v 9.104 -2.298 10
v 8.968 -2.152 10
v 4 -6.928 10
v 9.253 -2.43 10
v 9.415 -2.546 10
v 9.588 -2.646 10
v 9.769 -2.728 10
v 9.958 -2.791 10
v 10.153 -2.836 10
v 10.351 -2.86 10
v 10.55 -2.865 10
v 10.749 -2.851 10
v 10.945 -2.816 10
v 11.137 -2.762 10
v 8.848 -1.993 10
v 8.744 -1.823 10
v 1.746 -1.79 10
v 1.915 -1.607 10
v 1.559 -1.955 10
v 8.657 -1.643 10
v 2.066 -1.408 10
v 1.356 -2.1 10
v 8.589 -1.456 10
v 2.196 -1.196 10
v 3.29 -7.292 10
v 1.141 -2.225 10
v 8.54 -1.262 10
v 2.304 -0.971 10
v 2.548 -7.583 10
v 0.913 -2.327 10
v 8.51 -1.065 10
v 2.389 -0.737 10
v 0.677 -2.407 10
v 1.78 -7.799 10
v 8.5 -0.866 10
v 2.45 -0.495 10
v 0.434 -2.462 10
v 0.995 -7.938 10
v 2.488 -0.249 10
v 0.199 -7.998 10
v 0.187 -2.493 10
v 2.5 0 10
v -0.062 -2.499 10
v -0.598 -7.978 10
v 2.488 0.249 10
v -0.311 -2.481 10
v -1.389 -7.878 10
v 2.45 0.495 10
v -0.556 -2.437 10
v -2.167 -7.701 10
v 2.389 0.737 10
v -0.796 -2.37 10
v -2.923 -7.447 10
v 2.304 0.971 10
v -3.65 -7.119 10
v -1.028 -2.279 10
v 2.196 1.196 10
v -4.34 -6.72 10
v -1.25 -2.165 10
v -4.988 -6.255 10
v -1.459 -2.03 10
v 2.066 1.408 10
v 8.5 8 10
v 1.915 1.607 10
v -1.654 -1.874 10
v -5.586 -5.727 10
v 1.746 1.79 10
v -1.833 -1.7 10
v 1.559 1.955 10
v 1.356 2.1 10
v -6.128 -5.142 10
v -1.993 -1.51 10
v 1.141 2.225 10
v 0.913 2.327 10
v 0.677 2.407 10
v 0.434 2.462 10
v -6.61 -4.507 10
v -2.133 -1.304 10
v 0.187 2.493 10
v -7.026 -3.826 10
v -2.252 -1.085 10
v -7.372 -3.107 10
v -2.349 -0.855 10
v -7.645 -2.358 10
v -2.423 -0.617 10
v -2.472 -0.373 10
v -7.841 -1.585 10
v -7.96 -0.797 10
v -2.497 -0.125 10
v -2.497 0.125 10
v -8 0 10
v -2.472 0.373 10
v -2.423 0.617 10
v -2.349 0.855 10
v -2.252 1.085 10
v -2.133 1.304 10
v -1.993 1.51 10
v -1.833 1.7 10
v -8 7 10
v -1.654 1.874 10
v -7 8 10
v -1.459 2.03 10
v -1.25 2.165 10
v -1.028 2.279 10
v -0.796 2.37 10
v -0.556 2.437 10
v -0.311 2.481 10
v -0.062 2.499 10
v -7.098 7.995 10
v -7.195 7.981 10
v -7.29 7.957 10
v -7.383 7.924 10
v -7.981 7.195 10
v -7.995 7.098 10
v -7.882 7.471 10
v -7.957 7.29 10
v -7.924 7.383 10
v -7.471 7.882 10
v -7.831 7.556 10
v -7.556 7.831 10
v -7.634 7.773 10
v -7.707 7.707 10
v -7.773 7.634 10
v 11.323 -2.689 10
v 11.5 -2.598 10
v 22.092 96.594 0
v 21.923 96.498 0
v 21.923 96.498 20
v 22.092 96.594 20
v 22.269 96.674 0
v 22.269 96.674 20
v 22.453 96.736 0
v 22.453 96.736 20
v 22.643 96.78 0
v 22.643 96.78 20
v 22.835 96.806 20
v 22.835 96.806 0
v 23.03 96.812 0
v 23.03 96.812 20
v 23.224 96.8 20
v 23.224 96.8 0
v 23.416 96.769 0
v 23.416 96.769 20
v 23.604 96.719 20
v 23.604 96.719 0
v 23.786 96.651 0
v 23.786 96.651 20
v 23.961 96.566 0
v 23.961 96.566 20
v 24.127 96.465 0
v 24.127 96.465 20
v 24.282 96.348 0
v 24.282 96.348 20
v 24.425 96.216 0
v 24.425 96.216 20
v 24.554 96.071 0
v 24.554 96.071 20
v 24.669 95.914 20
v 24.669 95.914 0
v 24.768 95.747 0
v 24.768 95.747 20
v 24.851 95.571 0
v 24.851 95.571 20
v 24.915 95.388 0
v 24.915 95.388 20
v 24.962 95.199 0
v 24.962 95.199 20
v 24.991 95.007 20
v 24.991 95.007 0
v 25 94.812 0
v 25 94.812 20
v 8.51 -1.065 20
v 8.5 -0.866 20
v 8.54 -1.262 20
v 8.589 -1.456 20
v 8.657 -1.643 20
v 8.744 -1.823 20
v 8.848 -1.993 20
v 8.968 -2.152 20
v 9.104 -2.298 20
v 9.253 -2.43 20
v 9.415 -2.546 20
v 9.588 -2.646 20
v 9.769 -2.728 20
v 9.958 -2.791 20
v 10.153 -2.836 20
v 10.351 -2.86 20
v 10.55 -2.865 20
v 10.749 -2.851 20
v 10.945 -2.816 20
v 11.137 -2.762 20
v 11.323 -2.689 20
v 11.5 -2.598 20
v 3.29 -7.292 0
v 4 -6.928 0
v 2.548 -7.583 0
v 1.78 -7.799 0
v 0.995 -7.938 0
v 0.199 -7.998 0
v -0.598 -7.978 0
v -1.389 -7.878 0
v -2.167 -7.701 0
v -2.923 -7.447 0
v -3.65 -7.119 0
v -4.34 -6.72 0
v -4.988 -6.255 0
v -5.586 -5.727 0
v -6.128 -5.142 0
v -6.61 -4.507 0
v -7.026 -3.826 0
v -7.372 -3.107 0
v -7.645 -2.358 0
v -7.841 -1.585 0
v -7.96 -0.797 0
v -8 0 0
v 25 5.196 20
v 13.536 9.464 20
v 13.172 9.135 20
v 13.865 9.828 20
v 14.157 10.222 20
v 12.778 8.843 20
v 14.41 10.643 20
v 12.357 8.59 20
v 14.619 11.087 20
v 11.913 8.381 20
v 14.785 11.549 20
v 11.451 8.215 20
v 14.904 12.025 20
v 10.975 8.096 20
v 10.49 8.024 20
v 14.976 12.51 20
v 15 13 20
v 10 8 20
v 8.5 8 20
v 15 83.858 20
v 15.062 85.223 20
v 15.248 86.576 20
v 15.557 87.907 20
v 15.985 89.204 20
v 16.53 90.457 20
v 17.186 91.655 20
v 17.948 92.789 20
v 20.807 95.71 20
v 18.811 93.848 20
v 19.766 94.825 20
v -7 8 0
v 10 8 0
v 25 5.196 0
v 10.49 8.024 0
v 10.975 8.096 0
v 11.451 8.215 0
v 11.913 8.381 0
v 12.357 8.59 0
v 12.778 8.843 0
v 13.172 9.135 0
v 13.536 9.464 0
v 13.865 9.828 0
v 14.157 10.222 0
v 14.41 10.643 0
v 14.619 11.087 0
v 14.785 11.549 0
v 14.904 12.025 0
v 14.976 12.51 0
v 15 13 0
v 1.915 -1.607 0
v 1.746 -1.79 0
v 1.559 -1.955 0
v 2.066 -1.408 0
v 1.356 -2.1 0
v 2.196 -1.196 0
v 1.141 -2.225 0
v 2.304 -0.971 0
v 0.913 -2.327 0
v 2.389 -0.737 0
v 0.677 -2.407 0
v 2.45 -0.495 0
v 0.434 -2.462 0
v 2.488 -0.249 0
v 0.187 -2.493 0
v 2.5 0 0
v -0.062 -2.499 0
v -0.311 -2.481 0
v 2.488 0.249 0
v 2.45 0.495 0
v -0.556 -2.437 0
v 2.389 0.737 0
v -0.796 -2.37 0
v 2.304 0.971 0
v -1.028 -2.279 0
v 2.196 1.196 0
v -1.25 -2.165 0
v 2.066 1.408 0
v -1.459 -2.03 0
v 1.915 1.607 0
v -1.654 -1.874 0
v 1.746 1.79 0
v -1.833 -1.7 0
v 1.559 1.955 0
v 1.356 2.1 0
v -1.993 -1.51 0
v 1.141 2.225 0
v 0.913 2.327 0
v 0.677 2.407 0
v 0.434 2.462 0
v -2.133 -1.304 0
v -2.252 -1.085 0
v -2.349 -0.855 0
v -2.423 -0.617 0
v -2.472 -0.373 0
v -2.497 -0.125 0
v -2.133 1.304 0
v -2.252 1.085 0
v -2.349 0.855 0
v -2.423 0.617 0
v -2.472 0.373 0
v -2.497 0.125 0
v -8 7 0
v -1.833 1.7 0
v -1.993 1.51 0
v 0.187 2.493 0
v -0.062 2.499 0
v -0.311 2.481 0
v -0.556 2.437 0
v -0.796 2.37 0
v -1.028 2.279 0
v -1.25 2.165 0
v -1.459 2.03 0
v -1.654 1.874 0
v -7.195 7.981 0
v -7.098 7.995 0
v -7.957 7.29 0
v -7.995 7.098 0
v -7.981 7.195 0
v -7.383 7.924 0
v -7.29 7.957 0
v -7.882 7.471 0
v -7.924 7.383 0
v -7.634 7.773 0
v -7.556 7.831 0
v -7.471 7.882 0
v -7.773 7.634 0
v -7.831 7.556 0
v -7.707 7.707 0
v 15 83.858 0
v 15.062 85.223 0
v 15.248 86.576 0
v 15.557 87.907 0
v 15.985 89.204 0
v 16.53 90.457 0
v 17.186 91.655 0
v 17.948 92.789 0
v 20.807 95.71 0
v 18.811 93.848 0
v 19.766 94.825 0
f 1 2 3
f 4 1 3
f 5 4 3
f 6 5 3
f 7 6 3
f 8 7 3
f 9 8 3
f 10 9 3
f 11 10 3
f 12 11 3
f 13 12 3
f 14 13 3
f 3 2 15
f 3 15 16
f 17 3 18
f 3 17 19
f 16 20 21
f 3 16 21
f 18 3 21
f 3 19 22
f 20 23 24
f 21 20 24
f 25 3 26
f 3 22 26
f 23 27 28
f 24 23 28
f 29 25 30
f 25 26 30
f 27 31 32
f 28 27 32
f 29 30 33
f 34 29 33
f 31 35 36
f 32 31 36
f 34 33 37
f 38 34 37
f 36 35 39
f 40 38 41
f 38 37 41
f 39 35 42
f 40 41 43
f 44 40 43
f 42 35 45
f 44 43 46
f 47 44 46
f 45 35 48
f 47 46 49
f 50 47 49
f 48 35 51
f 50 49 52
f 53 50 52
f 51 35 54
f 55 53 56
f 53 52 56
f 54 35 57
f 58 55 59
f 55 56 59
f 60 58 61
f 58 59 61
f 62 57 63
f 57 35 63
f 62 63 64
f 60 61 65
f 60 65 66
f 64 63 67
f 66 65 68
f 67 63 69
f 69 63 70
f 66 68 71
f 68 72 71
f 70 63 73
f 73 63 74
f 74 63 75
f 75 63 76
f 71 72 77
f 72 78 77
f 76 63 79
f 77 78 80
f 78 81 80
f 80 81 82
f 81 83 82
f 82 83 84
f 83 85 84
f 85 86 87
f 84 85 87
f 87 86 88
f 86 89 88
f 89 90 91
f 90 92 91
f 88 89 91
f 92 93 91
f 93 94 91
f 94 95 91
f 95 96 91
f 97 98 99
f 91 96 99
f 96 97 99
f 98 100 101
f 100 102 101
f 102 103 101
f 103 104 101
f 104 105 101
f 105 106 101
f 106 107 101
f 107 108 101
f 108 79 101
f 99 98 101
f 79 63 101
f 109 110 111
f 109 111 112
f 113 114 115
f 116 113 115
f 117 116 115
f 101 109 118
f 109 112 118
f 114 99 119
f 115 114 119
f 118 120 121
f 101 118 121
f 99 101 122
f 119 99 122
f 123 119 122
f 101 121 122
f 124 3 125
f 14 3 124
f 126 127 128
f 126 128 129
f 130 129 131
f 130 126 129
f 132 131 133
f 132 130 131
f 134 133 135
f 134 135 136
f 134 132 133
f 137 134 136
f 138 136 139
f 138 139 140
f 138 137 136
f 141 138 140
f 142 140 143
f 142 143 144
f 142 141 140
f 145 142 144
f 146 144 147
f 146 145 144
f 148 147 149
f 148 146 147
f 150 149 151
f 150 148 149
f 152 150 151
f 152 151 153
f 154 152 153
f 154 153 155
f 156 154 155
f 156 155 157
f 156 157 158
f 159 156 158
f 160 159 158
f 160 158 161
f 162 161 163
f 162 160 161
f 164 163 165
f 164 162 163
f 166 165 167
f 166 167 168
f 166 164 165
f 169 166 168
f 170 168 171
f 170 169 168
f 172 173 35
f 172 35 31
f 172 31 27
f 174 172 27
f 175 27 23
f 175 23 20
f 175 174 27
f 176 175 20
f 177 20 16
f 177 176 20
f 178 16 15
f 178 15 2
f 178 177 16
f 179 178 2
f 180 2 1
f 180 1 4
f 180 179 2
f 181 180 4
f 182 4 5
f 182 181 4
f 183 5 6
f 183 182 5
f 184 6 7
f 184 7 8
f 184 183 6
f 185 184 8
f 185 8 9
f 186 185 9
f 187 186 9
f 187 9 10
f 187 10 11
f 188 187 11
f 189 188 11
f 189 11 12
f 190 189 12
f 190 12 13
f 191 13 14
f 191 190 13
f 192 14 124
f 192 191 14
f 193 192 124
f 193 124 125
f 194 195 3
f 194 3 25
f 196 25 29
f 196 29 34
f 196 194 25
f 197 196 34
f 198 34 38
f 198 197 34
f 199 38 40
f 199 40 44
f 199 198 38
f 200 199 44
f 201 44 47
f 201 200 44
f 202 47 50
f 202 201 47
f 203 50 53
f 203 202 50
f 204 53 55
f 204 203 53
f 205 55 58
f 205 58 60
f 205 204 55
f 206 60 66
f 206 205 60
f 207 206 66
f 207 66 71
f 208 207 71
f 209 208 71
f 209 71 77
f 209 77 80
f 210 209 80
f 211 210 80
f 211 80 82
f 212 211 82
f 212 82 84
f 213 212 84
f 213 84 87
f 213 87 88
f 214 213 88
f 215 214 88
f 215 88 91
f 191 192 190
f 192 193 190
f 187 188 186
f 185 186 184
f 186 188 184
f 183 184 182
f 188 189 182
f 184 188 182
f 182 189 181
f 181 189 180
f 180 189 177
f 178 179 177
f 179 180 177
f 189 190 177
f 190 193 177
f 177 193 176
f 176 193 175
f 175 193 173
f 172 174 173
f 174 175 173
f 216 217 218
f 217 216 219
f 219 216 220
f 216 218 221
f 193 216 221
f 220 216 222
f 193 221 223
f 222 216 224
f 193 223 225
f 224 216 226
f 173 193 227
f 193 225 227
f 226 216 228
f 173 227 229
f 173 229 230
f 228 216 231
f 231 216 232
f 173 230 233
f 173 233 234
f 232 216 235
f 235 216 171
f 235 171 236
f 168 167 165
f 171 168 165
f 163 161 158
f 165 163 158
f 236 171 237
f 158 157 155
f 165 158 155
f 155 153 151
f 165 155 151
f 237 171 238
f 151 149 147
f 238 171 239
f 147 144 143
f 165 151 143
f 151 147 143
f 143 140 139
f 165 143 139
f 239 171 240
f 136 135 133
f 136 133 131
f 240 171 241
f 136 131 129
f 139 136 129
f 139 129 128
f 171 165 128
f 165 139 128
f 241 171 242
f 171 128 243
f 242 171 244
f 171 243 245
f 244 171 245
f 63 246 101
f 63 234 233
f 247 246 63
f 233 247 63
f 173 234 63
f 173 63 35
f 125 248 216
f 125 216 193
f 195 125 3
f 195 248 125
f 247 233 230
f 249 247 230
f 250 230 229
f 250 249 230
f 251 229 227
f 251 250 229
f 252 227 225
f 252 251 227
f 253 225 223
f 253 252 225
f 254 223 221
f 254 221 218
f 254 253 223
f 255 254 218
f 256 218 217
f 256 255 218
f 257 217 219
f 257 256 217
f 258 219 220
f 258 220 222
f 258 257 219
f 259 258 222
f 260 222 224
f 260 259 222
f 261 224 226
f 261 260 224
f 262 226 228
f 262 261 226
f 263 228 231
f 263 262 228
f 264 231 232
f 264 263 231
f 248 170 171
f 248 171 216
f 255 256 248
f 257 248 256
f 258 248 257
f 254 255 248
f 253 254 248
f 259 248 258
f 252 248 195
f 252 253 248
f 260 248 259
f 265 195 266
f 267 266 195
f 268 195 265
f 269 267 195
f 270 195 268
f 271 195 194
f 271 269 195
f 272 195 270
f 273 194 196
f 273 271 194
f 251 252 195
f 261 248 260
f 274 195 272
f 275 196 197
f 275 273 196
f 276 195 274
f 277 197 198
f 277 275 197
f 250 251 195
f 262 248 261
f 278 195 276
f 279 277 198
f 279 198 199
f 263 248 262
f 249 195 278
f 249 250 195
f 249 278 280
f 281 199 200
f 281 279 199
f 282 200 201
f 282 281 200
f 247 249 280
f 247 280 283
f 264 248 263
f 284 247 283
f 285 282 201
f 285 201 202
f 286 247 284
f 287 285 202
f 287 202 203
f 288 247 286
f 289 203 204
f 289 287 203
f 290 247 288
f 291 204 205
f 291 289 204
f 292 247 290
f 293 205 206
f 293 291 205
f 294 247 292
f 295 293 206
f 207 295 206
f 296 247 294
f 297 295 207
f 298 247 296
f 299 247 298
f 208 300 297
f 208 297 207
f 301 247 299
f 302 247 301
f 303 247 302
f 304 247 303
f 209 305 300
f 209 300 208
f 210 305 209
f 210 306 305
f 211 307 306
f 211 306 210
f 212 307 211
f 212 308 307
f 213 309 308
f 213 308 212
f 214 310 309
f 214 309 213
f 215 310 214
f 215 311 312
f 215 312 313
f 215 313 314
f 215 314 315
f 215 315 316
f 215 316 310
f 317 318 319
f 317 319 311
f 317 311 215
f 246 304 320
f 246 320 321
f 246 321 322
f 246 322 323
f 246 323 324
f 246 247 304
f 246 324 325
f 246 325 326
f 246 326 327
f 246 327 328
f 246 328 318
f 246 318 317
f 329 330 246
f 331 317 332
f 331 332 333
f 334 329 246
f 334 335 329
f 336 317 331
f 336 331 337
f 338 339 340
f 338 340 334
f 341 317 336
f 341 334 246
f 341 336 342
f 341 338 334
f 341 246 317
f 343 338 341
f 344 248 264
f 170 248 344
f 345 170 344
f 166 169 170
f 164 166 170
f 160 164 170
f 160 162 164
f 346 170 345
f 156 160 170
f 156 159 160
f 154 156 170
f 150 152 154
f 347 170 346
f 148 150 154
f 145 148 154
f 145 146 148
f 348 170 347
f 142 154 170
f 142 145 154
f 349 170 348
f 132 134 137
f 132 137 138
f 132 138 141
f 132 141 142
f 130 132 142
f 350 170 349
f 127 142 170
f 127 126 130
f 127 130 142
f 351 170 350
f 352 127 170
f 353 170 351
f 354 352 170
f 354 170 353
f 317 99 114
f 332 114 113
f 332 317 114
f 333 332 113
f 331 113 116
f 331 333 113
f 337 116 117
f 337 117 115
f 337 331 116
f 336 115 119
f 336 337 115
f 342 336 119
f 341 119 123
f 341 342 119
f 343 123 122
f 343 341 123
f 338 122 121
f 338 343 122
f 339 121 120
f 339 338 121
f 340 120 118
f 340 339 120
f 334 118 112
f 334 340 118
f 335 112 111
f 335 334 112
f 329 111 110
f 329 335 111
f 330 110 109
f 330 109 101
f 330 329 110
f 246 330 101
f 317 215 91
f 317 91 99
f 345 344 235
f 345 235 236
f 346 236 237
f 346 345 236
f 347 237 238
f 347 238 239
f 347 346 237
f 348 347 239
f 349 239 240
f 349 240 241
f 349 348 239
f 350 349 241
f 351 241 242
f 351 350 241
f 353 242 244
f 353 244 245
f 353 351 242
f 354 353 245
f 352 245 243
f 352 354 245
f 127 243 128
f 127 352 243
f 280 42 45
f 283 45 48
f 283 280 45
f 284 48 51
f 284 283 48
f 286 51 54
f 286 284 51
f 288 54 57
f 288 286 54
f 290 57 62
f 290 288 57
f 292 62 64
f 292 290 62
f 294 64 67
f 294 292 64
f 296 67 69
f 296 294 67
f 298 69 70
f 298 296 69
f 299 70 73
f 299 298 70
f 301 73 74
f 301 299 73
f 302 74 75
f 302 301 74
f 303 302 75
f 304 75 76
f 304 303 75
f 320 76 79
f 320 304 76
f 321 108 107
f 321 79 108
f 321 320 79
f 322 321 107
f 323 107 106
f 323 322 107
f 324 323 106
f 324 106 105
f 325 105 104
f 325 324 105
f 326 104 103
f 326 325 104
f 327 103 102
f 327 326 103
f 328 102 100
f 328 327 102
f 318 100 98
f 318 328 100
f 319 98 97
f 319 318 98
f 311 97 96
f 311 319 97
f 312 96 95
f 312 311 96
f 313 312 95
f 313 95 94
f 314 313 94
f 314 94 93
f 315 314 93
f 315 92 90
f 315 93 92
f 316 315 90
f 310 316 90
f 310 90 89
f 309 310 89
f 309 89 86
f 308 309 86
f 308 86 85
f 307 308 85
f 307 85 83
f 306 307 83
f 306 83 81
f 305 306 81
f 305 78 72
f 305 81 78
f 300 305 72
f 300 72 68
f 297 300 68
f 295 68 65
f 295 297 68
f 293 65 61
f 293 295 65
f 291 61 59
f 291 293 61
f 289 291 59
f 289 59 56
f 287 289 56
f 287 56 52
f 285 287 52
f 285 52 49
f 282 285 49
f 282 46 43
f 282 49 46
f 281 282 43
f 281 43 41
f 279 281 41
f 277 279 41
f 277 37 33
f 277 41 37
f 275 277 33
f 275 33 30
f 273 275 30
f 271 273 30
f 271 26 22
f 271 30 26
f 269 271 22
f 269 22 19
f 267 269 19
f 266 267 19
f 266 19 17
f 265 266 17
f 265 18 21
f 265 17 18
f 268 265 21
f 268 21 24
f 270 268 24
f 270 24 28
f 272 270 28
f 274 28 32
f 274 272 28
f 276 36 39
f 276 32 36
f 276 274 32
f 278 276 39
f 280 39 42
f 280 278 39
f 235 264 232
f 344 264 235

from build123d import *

# Parameters (mm, degrees)
SKETCH1_R           = 2.5
BOSS_EXTRUDE1_DEPTH = 20
CUT_EXTRUDE1_DEPTH  = 10


with BuildPart() as part:
    # Sketch1 → Boss-Extrude1 (new body)
    with BuildSketch(Plane.XY):
        with BuildLine():
            Line((-7, 8), (10, 8))
            ThreePointArc((10, 8), (13.535533906, 9.464466094), (15, 13))
            Line((15, 13), (15, 83.857864376))
            ThreePointArc((15, 83.857864376), (16.84412971, 91.063631297), (21.923076923, 96.497615703))
            ThreePointArc((21.923076923, 96.497615703), (23.960768923, 96.566431565), (25, 94.812315526))
            Line((25, 94.812315526), (25, 5.196152423))
            Line((25, 5.196152423), (4, -6.92820323))
            ThreePointArc((4, -6.92820323), (-4, -6.92820323), (-8, 0))
            Line((-8, 0), (-8, 7))
            ThreePointArc((-8, 7), (-7.707106781, 7.707106781), (-7, 8))
        make_face()
        Circle(SKETCH1_R, mode=Mode.SUBTRACT)
    extrude(amount=BOSS_EXTRUDE1_DEPTH)

    # Sketch2 → Cut-Extrude1 (cut)
    with BuildSketch(Plane.XY.offset(20)):
        with BuildLine():
            Line((8.5, 8), (8.5, -0.866025404))
            ThreePointArc((8.5, -0.866025404), (9.5, -2.598076211), (11.5, -2.598076211))
            Line((11.5, -2.598076211), (4, -6.92820323))
            ThreePointArc((4, -6.92820323), (-4, -6.92820323), (-8, 0))
            Line((-8, 0), (-8, 7))
            ThreePointArc((-8, 7), (-7.707106781, 7.707106781), (-7, 8))
            Line((-7, 8), (8.5, 8))
        make_face()
    extrude(amount=-CUT_EXTRUDE1_DEPTH, mode=Mode.SUBTRACT)


solid = part.part
